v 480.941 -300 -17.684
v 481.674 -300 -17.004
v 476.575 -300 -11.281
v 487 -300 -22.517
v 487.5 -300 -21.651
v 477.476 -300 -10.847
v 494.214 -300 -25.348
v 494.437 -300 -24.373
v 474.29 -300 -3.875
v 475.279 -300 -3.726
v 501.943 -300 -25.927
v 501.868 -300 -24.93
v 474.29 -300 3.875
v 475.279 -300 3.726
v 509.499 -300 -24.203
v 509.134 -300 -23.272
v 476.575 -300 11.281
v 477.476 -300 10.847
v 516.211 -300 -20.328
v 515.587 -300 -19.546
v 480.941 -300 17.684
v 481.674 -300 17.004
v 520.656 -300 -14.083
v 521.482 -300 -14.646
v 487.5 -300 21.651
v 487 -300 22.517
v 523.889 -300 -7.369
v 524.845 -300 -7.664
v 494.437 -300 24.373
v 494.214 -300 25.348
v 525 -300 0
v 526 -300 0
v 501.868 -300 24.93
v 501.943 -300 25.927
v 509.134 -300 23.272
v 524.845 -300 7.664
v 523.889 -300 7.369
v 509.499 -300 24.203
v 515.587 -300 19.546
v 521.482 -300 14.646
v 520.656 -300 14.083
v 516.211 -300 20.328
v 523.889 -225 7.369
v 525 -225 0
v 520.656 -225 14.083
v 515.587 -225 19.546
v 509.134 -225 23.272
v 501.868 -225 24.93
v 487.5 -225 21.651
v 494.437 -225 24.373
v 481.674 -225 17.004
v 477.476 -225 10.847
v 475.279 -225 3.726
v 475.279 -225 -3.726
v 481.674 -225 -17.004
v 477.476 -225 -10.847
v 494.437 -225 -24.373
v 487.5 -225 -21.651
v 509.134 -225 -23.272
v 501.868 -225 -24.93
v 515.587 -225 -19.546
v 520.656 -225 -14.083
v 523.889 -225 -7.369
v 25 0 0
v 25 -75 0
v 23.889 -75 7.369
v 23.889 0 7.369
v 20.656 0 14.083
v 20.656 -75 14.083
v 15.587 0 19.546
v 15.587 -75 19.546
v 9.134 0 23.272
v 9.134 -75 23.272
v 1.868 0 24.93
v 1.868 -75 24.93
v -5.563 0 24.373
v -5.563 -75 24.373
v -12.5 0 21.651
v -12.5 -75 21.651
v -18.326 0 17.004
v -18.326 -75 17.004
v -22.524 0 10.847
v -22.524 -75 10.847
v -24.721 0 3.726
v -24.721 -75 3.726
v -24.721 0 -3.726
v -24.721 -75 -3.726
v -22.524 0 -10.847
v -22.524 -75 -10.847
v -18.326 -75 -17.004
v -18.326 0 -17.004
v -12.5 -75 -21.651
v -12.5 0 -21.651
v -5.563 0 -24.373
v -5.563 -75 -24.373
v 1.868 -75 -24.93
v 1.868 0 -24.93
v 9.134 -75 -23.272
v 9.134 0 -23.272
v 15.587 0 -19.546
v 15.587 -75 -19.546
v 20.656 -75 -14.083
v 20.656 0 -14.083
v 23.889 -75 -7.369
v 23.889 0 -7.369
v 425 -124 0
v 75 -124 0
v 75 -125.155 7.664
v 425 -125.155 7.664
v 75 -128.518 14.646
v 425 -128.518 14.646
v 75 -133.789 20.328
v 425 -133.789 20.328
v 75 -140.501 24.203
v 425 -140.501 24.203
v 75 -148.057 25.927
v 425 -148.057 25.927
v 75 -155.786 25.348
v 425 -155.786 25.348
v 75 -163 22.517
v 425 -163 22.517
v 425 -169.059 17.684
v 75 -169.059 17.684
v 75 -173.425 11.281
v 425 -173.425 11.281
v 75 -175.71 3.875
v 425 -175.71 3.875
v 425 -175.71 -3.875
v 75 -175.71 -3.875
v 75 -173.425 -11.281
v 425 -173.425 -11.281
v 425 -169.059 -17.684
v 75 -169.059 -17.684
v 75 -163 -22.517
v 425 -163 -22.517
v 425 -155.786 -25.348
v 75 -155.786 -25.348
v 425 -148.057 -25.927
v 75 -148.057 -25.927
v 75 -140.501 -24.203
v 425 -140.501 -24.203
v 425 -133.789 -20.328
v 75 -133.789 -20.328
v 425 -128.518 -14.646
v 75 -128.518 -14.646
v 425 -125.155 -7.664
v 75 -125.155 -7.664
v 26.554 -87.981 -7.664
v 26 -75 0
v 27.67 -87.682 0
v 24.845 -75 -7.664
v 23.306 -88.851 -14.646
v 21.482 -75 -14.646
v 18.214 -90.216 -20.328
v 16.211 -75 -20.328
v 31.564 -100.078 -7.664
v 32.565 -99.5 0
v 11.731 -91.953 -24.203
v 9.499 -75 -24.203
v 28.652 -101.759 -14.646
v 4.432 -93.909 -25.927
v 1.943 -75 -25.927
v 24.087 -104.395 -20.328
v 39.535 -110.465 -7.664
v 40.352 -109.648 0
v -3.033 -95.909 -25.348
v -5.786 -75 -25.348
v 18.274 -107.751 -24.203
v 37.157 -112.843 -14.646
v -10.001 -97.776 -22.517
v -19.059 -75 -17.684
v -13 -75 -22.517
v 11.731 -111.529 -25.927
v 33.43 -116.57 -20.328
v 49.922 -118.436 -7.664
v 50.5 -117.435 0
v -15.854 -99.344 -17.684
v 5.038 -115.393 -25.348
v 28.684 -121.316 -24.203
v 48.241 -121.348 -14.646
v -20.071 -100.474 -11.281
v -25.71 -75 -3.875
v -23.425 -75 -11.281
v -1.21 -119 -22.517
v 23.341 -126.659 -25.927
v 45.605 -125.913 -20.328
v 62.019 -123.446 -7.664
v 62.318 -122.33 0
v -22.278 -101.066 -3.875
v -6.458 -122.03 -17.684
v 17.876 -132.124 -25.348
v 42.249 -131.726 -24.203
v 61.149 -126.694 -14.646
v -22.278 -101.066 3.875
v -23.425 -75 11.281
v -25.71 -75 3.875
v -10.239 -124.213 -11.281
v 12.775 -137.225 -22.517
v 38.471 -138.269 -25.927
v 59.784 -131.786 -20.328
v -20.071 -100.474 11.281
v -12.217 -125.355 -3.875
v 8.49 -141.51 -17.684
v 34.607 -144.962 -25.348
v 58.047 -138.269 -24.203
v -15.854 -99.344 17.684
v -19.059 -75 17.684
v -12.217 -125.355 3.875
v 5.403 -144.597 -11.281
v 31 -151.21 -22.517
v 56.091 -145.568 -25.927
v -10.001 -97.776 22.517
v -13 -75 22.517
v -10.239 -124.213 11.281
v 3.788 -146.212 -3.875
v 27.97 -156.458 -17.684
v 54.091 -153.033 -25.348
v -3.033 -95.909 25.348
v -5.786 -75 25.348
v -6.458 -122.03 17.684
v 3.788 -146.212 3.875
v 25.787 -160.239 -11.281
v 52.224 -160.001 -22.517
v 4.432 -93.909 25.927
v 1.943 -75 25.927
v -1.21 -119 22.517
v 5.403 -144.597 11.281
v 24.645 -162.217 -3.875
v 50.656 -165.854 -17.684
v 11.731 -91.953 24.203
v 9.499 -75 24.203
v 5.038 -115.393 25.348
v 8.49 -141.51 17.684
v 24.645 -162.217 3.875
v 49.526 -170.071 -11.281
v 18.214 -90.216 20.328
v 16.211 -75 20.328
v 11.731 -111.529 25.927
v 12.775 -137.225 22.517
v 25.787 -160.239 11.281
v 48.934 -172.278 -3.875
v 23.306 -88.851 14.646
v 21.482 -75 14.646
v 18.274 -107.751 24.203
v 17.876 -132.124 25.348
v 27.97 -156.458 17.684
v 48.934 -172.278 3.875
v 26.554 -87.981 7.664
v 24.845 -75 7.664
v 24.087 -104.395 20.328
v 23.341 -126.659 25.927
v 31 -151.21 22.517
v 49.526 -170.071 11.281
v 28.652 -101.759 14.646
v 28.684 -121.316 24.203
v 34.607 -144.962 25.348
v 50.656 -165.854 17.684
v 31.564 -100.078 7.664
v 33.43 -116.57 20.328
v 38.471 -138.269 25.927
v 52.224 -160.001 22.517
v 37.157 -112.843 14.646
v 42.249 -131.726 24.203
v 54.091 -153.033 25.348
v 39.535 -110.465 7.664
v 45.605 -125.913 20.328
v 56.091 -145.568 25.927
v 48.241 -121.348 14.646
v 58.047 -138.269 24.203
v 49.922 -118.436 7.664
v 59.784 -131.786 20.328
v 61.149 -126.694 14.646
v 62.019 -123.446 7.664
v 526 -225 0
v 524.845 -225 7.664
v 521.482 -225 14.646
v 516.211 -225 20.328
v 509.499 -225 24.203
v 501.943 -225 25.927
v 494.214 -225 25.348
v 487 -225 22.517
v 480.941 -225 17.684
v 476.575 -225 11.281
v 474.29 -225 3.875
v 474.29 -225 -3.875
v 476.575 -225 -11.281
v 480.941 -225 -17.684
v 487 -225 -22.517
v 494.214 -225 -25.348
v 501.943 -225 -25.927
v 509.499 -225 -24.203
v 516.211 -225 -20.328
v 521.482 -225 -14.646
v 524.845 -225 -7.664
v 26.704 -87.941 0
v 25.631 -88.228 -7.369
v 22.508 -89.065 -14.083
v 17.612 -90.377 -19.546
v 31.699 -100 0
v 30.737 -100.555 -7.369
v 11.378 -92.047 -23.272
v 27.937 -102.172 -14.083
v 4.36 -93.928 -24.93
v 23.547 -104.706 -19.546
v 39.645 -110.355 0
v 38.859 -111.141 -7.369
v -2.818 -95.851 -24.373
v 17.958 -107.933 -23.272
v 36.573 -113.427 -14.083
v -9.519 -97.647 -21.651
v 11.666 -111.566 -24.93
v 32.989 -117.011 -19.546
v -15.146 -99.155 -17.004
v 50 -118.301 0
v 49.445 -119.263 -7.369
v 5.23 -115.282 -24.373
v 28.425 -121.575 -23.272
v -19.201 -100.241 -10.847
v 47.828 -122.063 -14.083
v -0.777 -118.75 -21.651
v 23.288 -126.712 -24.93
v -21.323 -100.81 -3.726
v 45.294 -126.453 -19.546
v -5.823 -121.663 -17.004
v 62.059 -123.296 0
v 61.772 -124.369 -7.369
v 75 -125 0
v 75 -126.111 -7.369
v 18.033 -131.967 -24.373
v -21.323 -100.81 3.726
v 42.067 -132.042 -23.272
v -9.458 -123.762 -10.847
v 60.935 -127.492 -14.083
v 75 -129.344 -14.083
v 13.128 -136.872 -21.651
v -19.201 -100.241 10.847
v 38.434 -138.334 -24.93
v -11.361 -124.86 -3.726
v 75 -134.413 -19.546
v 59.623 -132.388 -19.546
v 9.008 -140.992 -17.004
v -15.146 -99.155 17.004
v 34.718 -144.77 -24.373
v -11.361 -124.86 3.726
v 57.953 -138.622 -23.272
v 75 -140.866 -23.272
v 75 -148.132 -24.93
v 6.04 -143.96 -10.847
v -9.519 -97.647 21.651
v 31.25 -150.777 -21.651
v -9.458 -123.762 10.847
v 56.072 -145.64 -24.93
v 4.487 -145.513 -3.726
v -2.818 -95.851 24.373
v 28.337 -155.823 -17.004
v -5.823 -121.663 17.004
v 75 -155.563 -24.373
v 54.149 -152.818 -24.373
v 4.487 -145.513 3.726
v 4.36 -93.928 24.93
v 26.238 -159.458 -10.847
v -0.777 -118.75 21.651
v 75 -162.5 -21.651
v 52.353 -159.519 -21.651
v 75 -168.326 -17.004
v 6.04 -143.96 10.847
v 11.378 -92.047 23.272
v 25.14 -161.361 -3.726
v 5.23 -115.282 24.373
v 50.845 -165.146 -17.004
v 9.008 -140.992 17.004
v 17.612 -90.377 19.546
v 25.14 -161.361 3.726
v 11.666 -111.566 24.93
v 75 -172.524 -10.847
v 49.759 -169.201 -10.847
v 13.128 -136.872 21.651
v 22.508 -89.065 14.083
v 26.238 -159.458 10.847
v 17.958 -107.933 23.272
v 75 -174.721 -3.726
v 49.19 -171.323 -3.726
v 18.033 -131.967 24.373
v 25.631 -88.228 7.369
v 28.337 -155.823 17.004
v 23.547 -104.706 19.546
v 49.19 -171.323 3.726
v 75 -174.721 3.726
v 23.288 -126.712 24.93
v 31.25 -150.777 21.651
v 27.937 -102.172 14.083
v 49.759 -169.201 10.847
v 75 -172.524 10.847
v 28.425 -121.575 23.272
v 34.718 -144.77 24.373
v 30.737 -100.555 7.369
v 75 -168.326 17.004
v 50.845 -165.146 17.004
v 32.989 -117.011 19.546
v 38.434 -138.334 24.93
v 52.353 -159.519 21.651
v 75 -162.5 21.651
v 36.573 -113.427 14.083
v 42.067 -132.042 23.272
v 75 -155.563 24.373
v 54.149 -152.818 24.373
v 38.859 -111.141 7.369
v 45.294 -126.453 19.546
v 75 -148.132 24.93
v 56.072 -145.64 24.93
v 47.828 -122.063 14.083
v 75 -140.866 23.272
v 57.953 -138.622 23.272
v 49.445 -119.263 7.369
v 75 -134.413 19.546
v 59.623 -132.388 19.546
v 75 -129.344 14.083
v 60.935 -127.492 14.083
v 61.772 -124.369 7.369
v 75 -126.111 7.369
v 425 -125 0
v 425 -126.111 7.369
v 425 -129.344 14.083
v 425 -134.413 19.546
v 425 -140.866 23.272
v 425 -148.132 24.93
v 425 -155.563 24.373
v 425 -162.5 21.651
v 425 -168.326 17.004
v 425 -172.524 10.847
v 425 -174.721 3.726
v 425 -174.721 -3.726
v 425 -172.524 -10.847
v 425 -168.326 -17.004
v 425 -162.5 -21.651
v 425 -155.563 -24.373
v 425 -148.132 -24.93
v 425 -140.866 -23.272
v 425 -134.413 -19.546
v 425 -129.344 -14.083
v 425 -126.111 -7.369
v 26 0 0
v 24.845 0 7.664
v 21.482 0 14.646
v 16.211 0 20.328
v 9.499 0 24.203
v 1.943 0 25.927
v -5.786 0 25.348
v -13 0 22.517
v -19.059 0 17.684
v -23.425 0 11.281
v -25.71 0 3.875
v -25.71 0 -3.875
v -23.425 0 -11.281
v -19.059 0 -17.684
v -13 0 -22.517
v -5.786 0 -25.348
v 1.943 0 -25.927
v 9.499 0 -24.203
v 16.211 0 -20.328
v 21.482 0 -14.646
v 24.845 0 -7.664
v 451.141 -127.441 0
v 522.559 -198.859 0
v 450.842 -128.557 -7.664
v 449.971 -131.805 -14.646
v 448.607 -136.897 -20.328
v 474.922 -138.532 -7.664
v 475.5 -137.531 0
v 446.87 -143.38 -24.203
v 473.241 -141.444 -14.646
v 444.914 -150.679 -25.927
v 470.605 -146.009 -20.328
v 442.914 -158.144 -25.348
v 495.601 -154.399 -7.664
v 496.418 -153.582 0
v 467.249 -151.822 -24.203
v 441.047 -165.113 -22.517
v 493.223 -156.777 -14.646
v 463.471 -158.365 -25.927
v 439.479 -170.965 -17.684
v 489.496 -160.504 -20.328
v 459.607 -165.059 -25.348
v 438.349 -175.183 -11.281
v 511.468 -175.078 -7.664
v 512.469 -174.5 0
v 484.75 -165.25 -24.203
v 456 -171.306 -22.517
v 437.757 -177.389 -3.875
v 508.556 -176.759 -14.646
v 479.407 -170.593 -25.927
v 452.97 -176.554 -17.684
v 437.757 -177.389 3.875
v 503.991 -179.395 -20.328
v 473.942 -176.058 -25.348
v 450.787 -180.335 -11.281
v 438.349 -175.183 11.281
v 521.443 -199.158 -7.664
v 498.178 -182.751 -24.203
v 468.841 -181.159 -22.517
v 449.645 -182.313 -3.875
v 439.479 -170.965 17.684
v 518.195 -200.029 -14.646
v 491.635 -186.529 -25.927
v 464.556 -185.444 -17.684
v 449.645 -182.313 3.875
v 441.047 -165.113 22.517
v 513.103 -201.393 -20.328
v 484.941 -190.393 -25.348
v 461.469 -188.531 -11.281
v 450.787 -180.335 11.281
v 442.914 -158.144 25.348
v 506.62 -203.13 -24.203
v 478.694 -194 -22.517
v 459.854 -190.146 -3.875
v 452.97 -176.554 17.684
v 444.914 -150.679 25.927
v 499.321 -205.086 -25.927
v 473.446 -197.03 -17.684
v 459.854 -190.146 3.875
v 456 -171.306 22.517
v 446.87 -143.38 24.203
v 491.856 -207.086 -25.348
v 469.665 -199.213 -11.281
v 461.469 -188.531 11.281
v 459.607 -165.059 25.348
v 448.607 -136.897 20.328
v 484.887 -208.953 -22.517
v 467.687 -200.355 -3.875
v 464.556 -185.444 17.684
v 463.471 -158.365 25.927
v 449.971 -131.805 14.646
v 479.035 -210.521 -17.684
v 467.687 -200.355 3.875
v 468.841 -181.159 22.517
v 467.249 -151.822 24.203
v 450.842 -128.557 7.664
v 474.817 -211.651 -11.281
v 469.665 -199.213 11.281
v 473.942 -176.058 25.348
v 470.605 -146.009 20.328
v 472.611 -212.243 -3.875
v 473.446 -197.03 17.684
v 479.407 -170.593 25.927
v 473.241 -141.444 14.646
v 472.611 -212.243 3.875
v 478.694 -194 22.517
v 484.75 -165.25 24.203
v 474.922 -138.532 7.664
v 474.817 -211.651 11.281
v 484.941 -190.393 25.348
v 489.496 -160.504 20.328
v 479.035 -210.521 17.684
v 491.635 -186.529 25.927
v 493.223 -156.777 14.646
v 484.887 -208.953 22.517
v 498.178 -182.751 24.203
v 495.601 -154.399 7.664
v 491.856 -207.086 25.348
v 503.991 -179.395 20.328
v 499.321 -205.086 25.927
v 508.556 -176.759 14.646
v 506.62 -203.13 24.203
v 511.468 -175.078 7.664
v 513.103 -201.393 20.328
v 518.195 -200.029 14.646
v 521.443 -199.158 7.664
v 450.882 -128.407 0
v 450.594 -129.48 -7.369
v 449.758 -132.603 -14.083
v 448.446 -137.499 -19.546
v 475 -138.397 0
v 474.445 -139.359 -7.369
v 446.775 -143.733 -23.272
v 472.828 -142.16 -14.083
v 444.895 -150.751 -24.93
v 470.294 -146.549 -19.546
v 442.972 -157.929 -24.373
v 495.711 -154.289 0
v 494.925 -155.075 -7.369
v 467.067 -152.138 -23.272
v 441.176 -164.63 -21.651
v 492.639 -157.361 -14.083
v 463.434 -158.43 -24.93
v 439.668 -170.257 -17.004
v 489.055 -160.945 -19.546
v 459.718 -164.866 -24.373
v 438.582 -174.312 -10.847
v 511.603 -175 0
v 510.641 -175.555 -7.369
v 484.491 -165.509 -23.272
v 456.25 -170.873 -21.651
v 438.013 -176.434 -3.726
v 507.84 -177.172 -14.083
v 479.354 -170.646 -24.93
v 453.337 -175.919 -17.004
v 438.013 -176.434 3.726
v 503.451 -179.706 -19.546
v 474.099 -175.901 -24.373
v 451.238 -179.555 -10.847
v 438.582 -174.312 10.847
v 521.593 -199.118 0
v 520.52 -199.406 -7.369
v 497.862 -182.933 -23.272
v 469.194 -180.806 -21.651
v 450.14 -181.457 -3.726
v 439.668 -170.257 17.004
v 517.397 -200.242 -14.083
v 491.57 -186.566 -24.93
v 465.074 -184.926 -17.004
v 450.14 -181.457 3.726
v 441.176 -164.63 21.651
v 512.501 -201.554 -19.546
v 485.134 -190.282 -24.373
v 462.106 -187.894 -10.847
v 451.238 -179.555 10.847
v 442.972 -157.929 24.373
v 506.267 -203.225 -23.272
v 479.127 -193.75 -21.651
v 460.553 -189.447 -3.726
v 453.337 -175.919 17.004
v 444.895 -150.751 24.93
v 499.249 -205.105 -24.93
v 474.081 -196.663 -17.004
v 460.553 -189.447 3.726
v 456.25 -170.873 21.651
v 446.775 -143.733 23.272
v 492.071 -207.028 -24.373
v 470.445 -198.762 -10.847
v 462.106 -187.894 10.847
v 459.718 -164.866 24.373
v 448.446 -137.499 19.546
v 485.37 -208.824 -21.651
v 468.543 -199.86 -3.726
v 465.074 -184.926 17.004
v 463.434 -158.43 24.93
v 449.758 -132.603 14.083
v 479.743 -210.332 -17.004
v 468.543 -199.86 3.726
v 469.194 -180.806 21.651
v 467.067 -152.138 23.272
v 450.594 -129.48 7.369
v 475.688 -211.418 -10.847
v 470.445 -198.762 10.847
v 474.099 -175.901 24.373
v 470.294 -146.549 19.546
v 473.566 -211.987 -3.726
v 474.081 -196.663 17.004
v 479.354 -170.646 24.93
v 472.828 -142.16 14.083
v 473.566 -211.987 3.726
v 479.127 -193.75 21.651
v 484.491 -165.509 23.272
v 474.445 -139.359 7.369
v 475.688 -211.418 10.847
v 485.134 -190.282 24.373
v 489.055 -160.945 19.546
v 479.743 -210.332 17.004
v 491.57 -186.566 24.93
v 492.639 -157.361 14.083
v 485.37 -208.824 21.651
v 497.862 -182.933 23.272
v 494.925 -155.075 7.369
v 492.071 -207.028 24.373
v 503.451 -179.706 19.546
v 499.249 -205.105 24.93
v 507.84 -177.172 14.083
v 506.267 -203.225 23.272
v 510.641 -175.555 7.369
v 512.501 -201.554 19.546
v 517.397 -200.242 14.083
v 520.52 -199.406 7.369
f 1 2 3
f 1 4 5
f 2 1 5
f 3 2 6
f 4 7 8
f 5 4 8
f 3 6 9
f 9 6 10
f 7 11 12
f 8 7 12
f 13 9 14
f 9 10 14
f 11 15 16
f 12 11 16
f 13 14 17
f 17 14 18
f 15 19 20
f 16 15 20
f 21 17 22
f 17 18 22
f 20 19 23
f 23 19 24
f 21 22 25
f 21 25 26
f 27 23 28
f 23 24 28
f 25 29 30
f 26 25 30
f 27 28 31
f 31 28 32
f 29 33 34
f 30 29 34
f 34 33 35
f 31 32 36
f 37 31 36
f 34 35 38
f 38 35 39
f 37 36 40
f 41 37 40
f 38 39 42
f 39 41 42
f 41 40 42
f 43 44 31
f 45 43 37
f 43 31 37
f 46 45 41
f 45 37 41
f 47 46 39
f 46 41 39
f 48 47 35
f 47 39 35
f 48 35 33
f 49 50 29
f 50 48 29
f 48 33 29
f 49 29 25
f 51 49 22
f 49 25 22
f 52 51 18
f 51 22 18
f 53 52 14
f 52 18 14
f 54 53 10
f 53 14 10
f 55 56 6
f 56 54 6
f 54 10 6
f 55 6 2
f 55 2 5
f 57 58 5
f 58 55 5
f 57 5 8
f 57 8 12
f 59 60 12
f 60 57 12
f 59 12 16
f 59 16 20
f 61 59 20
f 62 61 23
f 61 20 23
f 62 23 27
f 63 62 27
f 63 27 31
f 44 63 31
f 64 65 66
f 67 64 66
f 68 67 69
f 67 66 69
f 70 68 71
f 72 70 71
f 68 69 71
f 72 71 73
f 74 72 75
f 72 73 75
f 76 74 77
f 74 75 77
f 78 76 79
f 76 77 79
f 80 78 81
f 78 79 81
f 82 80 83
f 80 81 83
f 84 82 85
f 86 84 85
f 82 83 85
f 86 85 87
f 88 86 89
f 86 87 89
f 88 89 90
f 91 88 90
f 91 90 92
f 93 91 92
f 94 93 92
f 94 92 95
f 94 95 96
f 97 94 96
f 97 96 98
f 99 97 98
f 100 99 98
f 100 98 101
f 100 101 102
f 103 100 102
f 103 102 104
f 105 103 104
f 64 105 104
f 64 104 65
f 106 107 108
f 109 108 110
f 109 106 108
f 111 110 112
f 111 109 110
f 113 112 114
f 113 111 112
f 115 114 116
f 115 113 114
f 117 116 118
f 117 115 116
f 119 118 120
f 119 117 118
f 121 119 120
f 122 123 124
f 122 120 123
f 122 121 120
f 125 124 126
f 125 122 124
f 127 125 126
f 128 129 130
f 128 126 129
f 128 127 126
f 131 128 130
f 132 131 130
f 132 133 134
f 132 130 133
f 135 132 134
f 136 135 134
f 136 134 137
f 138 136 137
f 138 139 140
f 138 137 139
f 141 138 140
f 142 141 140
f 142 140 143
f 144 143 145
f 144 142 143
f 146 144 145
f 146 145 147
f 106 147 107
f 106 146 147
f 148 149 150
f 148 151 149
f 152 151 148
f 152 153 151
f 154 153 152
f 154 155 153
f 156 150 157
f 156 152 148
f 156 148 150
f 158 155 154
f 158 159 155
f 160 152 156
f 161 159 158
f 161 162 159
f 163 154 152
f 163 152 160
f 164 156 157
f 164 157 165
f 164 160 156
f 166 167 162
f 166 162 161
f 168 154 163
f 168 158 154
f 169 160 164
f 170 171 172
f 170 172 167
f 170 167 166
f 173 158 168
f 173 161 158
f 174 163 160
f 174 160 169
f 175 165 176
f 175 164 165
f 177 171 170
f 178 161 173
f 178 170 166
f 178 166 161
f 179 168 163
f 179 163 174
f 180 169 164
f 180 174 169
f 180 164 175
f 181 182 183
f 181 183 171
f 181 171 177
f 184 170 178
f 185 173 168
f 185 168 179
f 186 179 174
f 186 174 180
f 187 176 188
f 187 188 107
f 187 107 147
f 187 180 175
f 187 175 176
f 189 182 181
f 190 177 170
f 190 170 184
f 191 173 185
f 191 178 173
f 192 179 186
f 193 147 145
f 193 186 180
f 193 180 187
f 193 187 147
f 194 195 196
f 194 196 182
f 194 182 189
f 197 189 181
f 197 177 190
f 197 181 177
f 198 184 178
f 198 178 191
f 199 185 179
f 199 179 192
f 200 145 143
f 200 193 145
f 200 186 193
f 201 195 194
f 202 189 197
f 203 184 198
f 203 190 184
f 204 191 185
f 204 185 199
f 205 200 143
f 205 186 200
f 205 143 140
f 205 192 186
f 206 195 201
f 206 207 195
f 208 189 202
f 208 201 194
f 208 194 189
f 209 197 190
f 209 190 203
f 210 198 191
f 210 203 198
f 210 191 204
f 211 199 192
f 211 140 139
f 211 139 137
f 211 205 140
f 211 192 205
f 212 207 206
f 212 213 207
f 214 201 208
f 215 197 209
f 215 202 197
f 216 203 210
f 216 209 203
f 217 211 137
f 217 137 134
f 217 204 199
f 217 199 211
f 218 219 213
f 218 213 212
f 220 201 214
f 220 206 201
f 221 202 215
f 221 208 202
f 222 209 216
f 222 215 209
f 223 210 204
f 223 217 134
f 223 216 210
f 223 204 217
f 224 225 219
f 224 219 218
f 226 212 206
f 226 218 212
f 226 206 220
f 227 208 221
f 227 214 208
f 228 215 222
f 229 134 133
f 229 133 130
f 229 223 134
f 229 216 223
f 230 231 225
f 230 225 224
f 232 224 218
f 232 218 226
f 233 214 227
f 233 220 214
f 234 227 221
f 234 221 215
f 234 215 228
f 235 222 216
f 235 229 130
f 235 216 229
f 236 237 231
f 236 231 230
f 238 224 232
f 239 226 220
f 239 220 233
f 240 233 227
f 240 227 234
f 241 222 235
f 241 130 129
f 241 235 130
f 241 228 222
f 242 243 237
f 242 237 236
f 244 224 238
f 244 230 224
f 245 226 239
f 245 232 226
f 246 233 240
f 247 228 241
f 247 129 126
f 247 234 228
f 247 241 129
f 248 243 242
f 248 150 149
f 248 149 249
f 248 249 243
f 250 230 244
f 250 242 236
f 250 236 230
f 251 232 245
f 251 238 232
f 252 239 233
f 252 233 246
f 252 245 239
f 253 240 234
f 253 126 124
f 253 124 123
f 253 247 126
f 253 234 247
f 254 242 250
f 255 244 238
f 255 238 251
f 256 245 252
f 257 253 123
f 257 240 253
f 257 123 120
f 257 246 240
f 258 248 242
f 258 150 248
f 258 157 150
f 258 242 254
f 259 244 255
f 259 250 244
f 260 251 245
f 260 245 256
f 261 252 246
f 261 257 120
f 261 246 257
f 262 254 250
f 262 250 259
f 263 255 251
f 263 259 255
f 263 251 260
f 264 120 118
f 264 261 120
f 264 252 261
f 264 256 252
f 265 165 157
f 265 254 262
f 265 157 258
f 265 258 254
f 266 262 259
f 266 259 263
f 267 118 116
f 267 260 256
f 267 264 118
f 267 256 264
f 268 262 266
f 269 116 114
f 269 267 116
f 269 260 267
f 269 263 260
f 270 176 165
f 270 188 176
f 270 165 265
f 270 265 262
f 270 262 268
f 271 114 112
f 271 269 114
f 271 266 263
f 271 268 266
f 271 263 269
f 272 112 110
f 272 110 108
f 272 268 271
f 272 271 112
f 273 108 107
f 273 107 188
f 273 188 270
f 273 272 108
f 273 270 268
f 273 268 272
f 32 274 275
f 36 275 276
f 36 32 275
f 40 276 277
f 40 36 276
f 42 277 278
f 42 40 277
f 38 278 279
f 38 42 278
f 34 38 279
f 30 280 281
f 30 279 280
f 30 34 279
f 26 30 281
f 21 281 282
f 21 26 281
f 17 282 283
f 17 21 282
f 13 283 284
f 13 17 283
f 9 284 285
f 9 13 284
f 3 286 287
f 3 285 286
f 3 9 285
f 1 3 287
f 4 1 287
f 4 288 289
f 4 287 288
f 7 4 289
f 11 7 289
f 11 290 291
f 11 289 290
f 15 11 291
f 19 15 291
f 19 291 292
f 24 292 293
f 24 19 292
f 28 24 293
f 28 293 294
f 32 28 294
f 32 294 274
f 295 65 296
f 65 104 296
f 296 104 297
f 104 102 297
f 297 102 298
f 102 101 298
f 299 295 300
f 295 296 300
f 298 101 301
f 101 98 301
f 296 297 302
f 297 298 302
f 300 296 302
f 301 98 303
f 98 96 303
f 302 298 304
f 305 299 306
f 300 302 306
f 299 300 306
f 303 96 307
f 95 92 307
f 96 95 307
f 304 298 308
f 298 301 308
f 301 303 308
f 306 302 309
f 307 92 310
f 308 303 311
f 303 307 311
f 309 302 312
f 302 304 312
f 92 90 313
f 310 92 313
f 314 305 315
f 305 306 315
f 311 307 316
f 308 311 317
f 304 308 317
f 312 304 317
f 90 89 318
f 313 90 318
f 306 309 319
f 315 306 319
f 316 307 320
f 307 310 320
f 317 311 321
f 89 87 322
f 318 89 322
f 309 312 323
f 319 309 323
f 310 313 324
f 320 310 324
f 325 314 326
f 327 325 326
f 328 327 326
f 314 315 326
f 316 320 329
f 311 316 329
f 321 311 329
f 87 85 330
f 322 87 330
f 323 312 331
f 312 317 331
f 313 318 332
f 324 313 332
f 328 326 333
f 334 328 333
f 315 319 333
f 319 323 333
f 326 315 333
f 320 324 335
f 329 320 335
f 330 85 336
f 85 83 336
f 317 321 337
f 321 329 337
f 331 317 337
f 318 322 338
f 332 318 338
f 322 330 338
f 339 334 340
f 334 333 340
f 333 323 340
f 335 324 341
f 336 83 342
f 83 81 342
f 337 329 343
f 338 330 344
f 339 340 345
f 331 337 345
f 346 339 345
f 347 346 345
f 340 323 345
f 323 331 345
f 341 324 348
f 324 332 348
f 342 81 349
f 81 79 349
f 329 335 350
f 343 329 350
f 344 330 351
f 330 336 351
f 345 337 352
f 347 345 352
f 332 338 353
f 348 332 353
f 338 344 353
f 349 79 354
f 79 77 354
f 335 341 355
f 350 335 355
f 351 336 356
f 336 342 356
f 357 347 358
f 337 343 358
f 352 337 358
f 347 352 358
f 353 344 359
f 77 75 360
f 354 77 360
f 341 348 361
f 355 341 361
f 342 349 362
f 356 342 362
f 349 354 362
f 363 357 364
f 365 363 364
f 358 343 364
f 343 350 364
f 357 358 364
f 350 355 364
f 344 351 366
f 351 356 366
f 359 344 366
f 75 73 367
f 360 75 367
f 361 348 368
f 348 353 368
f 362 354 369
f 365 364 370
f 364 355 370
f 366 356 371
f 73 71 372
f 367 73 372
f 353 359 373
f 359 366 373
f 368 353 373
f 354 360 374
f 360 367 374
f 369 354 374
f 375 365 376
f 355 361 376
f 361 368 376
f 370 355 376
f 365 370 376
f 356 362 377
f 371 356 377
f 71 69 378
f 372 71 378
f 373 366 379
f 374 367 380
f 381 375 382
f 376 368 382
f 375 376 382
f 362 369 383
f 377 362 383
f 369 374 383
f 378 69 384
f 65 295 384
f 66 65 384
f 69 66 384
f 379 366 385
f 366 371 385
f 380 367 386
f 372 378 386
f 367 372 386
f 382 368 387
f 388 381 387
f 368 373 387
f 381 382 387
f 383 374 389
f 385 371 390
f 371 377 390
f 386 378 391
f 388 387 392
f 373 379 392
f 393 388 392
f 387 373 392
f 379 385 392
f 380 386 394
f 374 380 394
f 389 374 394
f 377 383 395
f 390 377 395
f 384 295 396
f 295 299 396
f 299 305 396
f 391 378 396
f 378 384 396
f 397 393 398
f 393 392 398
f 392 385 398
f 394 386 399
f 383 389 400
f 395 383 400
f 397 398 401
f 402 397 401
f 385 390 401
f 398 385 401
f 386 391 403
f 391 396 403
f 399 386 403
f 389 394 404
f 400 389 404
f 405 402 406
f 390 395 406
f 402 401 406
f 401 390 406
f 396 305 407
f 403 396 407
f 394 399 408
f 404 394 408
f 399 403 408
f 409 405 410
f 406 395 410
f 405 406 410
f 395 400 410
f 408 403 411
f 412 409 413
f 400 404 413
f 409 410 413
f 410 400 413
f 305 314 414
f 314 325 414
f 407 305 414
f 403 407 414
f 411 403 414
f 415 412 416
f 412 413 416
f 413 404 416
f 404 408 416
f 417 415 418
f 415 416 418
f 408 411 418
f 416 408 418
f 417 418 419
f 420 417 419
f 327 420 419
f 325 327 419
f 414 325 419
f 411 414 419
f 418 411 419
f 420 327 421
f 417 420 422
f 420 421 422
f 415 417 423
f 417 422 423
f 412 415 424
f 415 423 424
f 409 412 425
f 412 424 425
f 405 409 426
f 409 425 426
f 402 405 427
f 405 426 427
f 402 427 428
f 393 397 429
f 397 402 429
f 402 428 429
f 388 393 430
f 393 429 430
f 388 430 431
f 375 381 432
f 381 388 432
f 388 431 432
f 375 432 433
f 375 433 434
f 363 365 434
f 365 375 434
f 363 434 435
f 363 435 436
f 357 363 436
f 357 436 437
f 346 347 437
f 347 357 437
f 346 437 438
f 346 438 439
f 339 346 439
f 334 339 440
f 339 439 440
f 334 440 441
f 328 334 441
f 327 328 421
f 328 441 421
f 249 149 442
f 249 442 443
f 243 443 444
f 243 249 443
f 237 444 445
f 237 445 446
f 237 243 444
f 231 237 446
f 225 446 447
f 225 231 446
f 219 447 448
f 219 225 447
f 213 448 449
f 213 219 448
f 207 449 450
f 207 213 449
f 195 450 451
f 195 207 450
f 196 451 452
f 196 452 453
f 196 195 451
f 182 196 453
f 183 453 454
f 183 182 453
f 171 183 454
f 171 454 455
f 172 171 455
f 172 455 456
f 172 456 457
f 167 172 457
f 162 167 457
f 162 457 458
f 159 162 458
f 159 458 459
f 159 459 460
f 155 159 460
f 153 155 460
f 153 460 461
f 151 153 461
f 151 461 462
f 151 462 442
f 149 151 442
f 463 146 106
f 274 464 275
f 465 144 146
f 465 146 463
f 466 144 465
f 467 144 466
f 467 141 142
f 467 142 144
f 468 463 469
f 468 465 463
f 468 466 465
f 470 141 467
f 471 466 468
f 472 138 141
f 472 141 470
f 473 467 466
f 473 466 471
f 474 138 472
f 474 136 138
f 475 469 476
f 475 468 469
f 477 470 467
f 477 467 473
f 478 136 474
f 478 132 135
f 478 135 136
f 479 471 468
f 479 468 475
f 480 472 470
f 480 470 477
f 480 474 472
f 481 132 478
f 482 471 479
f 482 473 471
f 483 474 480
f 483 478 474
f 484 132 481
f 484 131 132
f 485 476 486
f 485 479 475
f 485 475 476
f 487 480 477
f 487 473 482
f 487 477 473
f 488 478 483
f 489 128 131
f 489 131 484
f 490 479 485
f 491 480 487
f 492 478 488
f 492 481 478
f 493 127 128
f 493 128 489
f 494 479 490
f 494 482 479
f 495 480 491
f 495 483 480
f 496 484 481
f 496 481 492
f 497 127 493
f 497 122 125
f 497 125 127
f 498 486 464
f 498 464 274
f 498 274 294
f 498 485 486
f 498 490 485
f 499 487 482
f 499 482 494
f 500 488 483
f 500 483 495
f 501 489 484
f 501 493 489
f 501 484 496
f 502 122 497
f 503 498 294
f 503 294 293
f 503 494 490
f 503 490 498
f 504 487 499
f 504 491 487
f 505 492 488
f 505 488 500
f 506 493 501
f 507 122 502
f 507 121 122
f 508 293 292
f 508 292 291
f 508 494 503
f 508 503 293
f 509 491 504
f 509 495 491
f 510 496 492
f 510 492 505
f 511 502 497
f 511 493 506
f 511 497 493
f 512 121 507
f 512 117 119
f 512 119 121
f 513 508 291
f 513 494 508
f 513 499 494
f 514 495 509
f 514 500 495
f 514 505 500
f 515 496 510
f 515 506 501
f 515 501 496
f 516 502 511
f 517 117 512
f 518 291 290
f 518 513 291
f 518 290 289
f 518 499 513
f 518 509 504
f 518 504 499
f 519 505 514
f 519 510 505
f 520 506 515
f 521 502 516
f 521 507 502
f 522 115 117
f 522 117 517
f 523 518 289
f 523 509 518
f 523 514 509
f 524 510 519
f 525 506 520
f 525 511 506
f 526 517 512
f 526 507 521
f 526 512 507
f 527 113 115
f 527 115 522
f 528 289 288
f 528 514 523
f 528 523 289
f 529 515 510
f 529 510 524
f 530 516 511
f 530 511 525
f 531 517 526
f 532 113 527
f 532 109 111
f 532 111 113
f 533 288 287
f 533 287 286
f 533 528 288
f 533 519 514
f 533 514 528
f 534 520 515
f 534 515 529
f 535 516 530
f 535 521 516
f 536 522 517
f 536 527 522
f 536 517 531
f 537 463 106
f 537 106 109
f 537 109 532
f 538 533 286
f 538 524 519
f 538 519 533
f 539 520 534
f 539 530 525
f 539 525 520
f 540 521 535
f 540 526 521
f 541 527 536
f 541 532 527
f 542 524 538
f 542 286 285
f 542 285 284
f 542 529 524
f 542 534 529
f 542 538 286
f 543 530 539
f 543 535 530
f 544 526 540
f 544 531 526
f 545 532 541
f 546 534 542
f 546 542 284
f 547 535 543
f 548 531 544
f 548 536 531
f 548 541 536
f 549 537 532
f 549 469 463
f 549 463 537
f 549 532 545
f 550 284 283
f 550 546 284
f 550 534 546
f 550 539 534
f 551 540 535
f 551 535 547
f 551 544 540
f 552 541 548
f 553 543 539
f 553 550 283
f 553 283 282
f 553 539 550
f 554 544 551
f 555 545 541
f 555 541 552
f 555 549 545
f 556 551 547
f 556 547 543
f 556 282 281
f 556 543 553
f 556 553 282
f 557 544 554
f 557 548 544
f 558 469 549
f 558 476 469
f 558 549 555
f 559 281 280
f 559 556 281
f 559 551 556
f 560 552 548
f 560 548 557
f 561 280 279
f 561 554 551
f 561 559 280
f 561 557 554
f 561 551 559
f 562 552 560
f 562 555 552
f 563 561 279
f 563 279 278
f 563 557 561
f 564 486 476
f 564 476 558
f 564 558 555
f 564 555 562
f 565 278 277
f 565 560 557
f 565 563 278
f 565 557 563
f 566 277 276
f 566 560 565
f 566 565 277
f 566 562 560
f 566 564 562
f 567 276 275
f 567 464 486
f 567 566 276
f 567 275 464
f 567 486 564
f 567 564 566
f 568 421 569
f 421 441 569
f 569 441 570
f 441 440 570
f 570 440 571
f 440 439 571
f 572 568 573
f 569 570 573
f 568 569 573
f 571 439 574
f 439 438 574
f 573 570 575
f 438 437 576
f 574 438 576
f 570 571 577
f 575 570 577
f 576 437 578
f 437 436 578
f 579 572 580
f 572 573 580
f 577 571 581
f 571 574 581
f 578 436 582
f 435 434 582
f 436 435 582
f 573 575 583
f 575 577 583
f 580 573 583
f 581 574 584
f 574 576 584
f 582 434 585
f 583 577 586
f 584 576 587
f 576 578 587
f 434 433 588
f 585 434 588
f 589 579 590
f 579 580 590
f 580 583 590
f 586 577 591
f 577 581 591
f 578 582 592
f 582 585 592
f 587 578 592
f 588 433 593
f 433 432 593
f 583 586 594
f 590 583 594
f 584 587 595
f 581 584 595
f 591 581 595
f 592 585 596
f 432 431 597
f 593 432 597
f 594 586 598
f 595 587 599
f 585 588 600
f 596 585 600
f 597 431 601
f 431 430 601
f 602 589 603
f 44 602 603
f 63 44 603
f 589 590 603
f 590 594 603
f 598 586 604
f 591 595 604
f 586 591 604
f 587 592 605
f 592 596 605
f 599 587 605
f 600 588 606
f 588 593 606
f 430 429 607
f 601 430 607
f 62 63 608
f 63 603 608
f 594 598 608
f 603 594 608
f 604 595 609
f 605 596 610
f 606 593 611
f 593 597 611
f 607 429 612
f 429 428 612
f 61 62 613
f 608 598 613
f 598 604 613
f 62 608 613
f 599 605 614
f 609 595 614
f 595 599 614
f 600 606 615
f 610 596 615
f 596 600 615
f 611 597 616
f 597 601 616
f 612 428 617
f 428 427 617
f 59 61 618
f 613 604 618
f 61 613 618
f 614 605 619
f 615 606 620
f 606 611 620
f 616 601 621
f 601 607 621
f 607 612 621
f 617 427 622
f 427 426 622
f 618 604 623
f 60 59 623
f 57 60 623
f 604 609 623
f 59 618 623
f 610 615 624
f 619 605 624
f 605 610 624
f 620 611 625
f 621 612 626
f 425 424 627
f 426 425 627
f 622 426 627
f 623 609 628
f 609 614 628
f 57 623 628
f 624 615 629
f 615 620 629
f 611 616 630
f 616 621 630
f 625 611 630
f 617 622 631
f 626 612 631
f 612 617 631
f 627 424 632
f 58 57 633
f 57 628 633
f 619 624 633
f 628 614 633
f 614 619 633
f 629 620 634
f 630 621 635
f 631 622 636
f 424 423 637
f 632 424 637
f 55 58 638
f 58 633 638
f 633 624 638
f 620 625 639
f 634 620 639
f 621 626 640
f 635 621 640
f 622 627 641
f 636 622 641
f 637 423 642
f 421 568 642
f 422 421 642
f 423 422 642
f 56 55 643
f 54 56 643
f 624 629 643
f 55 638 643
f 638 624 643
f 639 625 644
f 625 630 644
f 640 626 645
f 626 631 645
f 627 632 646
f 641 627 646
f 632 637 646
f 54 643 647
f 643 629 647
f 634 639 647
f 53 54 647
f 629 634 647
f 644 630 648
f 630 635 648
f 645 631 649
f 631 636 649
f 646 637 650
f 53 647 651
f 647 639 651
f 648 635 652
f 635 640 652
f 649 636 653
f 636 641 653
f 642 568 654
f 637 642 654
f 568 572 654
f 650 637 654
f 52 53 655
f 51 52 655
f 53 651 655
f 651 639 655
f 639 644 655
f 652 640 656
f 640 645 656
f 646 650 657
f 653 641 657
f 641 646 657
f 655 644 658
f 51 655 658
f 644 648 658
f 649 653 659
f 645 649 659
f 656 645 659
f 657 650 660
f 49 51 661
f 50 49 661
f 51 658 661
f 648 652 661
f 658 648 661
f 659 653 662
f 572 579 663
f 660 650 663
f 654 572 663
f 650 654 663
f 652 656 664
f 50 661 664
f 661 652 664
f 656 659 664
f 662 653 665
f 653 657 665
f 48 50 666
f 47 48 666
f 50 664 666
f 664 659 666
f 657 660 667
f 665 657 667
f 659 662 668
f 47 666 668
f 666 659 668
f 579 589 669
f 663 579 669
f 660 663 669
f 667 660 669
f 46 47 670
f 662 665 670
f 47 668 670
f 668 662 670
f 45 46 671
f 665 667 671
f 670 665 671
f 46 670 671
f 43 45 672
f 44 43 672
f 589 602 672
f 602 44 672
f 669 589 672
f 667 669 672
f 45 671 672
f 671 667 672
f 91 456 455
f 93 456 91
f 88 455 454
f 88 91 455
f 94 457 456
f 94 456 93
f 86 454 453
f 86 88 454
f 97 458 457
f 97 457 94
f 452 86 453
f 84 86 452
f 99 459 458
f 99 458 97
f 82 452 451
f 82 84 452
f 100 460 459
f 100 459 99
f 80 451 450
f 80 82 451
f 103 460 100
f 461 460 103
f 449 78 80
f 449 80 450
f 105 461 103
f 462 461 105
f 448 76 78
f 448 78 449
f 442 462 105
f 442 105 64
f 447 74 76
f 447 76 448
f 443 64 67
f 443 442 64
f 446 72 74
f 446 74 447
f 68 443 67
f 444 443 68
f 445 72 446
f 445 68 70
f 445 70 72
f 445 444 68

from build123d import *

# Parameters (mm, degrees)
SKETCH1_R   = 26
SKETCH1_R_2 = 25


with BuildPart() as part:
    # Sweep-Thin1: sweep along a path in Sketch2
    with BuildLine(Plane.XY) as sweep_thin1_path:
        Line((0, 0), (0, -75))
        ThreePointArc((0, -75), (21.966991411, -128.033008589), (75, -150))
        Line((75, -150), (425, -150))
        ThreePointArc((425, -150), (478.033008589, -171.966991411), (500, -225))
        Line((500, -225), (500, -300))
    # Sketch1 → Sweep-Thin1 (sweep)
    with BuildSketch(Plane(origin=(0, 0, 0), x_dir=(1, 0, 0), z_dir=(0, 1, 0))):
        Circle(SKETCH1_R)
        Circle(SKETCH1_R_2, mode=Mode.SUBTRACT)
    sweep(path=sweep_thin1_path.line)


solid = part.part
